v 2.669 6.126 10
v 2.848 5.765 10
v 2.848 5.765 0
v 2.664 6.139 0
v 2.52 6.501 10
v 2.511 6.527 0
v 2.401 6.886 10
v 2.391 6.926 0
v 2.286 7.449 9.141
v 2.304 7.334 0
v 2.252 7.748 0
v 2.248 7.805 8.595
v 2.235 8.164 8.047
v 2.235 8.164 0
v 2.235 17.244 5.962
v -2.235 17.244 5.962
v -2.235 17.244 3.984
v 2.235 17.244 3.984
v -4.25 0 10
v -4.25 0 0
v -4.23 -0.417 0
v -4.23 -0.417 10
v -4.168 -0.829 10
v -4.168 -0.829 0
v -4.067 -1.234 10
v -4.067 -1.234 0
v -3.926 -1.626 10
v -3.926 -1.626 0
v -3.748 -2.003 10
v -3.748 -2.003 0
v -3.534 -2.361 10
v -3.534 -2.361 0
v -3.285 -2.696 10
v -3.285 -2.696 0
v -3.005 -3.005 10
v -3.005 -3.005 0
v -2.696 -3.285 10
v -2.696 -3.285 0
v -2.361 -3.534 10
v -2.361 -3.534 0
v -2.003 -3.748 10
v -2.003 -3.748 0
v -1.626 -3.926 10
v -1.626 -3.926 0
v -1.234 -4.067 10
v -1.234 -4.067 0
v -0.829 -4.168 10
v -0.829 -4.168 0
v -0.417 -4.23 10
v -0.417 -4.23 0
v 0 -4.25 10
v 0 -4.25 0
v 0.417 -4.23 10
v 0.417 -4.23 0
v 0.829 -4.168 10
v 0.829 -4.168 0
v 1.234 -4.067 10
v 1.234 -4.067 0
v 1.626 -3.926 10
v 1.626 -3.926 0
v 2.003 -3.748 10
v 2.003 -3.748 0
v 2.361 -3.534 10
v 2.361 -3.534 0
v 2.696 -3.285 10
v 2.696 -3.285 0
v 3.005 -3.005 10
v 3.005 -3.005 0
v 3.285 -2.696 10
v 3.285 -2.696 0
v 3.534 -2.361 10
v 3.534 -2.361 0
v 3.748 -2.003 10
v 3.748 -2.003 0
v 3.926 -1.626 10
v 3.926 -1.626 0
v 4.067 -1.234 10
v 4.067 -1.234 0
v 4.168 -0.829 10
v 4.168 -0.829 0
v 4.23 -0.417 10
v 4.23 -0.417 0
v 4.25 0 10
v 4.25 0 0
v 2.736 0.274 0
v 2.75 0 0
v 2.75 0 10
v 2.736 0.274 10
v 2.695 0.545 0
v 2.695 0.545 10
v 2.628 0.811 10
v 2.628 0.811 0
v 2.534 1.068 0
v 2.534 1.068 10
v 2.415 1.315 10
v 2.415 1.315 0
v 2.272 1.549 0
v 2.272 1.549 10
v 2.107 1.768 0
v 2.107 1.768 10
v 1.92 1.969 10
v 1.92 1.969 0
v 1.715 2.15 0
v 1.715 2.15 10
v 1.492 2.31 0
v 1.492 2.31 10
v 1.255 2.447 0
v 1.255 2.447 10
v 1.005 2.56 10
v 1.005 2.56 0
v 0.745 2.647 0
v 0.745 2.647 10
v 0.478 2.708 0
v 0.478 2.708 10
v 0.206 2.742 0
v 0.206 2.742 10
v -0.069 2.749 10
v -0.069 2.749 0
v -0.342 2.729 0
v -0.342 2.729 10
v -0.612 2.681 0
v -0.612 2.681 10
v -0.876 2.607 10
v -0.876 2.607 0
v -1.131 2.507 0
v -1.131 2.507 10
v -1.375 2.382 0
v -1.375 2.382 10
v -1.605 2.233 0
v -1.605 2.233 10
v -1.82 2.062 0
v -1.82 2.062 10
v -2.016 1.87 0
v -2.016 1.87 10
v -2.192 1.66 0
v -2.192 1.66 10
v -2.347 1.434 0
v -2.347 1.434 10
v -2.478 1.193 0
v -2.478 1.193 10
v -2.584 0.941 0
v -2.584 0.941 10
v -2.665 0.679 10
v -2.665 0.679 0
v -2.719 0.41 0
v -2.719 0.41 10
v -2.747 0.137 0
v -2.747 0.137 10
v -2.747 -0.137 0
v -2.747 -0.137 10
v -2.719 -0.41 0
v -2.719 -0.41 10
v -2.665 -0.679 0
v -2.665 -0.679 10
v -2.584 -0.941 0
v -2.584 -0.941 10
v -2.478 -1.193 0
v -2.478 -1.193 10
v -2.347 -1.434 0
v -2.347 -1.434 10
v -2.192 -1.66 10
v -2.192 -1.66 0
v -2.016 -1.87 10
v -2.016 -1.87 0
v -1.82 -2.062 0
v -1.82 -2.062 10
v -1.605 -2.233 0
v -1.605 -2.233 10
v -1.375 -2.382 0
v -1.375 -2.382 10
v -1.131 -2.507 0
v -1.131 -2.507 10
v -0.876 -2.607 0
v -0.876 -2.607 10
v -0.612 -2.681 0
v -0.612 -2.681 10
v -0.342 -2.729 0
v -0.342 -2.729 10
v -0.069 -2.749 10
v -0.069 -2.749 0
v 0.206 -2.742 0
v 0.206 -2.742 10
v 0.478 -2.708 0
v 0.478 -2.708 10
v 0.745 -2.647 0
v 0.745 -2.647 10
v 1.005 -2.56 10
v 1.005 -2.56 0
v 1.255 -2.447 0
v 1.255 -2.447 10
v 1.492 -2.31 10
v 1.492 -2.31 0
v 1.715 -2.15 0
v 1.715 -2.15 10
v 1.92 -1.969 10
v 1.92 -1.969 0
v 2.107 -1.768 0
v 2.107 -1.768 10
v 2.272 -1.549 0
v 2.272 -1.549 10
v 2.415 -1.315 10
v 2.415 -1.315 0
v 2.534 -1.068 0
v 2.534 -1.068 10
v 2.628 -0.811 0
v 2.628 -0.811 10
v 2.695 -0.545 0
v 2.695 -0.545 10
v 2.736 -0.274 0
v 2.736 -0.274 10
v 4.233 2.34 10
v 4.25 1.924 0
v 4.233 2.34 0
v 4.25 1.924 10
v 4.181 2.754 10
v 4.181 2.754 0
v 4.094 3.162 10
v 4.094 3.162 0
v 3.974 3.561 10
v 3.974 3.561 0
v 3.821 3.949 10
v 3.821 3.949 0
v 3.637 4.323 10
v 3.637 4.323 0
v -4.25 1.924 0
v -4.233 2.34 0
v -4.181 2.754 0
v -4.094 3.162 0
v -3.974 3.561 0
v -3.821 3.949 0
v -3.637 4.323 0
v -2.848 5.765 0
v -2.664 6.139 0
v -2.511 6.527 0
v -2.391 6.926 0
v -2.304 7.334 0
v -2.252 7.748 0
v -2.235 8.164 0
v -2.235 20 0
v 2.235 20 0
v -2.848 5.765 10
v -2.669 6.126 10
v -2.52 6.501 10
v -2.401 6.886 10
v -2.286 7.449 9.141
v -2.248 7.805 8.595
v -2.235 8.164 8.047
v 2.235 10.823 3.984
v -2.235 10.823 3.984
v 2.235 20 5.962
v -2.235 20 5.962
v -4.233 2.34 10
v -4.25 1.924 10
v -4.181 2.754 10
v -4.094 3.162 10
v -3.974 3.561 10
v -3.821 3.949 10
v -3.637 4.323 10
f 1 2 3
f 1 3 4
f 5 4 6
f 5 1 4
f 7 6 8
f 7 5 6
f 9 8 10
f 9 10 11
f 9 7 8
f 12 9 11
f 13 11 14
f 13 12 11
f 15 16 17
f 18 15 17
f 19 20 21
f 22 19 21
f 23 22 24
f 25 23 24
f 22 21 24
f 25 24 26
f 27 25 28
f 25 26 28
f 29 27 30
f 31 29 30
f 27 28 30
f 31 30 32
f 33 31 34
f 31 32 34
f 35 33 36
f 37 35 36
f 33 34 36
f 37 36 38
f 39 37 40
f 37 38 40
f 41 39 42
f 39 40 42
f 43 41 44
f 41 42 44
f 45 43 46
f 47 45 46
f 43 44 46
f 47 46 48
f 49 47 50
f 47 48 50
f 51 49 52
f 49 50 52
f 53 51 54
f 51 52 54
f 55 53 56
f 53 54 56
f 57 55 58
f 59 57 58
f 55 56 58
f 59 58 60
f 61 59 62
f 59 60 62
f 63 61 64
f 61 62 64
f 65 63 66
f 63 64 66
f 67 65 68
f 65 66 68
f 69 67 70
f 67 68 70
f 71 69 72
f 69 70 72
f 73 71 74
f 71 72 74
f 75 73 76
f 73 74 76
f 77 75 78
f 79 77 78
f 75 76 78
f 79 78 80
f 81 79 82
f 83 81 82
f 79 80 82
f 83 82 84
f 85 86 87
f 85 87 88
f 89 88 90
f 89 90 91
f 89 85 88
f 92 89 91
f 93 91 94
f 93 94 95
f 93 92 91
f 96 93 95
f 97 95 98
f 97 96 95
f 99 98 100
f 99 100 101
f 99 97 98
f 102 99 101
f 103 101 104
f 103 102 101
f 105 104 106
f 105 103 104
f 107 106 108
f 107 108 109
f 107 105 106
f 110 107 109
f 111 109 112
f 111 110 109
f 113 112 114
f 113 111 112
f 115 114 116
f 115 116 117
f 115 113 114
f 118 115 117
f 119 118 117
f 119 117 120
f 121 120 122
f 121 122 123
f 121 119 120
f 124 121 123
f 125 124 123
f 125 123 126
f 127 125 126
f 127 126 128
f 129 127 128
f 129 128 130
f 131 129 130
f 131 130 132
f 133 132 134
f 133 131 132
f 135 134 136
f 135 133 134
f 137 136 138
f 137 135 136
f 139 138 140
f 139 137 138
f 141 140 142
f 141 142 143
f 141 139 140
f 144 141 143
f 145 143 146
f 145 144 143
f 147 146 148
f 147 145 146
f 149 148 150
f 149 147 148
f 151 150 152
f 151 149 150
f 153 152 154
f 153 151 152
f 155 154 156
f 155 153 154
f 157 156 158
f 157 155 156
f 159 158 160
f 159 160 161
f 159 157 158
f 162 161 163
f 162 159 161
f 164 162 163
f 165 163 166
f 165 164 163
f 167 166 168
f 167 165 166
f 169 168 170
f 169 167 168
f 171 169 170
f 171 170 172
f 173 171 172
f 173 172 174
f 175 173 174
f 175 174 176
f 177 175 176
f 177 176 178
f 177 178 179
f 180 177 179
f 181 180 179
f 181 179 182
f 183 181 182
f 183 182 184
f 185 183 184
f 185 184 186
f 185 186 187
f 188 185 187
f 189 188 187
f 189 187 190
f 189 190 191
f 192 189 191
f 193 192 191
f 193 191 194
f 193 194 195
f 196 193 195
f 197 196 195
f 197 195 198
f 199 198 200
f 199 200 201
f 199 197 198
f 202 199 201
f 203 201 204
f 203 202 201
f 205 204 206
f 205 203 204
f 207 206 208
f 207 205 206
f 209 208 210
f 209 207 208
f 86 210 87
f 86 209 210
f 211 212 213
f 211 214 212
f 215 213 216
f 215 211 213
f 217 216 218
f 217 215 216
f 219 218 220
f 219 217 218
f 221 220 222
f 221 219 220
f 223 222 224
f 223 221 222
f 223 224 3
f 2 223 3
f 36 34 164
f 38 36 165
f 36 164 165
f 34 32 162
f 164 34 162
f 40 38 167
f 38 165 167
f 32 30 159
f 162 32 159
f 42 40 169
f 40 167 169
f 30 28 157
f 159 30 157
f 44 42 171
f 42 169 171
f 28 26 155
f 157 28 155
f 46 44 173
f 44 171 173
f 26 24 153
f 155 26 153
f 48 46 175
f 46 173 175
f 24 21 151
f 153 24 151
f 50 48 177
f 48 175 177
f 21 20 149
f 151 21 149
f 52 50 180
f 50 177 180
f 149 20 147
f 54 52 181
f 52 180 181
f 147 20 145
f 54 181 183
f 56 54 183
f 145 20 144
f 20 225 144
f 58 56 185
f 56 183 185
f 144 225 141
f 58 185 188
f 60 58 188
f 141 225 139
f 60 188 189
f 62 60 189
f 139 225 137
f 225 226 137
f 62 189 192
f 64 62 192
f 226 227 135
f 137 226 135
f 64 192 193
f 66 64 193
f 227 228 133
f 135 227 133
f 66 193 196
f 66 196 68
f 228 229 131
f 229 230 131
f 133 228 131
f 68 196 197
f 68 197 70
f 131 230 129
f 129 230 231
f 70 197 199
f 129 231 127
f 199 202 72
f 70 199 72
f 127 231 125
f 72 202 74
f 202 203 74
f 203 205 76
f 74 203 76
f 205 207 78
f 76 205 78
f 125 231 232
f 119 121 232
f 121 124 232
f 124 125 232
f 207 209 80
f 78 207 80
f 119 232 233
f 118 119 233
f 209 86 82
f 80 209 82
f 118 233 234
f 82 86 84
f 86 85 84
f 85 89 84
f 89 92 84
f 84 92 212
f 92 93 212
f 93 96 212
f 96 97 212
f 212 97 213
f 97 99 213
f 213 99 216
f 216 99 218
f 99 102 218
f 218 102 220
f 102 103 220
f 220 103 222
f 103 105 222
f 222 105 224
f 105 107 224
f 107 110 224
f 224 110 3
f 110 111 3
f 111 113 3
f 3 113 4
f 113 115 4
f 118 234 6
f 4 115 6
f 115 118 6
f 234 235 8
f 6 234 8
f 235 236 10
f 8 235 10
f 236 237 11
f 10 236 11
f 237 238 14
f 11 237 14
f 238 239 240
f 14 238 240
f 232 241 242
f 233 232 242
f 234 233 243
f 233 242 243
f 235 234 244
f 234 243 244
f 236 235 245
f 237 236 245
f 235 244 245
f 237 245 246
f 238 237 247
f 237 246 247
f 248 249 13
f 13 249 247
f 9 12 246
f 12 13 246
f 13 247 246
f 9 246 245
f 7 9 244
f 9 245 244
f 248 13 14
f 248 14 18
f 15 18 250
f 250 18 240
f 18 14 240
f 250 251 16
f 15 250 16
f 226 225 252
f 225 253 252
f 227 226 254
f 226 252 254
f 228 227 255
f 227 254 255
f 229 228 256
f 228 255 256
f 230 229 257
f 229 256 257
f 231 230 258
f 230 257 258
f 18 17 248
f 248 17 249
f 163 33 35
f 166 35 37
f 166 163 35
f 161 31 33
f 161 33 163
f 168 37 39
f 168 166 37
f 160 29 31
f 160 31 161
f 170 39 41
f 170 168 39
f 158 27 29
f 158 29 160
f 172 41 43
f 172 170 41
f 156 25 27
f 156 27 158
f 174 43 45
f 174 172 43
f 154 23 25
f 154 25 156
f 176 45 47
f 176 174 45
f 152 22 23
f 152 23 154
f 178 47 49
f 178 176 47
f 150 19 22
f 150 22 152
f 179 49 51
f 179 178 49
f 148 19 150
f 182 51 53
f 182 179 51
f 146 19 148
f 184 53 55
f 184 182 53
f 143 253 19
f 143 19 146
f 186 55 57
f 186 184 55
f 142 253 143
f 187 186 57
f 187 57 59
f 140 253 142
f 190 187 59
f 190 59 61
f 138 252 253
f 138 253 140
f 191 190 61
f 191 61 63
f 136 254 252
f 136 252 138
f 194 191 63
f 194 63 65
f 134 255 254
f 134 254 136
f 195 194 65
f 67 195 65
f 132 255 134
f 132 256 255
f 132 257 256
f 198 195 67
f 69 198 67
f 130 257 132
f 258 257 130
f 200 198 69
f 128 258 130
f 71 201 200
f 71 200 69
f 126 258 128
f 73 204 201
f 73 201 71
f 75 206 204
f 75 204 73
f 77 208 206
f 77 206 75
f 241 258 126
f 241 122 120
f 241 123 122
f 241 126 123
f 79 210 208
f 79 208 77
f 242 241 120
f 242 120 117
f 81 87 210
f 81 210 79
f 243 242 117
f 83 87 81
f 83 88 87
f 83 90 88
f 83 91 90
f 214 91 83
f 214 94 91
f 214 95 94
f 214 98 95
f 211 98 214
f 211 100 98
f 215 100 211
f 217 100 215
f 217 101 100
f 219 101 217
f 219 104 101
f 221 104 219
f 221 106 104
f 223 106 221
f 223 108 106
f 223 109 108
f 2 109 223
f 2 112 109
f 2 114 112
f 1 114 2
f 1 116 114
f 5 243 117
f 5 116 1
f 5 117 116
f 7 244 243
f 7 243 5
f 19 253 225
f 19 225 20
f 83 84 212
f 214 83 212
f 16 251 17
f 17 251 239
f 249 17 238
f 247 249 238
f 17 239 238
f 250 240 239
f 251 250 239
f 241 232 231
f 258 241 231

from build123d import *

# Parameters (mm, degrees)
F0_R     = 2.75
F1_DEPTH = 10
F3_DEPTH = 10
F4_F1_R  = 5
F4_F2_R  = 5
F4_F3_R  = 5
F4_F4_R  = 5


with BuildPart() as f1:
    # F0 (on Top) → F1 (new body)
    with BuildSketch(Plane.XY):
        with BuildLine():
            ThreePointArc((-4.25, 0), (0, 4.25), (4.25, 0))
            Line((4.25, 0), (4.25, 3.201806685))
            Line((4.25, 3.201806685), (2.2350018844, 6.8861790933))
            Line((2.2350018844, 6.8861790933), (2.2350018844, 10.8956433833))
            Line((2.2350018844, 10.8956433833), (2.2350018844, 20))
            Line((2.2350018844, 20), (-2.2350018844, 20))
            Line((-2.2350018844, 20), (-2.2350018844, 10.8956433833))
            Line((-2.2350018844, 10.8956433833), (-2.2350018844, 6.8861790933))
            Line((-2.2350018844, 6.8861790933), (-4.25, 3.201806685))
            Line((-4.25, 3.201806685), (-4.25, 0))
        make_face()
        with BuildLine():
            ThreePointArc((-4.25, 0), (0, -4.25), (4.25, 0))
            ThreePointArc((4.25, 0), (0, 4.25), (-4.25, 0))
        make_face()
        Circle(F0_R, mode=Mode.SUBTRACT)
    extrude(amount=F1_DEPTH)

    # F2 (on face) → F3 (cut)
    with BuildSketch(Plane(origin=(-2.2350018844, 0, 0), x_dir=(0, -1, 0), z_dir=(-1, 0, 0))):
        Polygon((-10.8234519139, 3.9840904064), (-6.8861790933, 10), (-20, 10), (-20, 5.9617315419), (-17.2440130264, 5.9617315419), (-17.2440130264, 3.9840904064), align=None)
    extrude(amount=-F3_DEPTH, mode=Mode.SUBTRACT)

    # F4: fillet of radius 5 on 6 edges, made by hand

    # F4_f1
    f4_f1_edges = [f1.edges().sort_by_distance(p)[0] for p in [
        (-4.25, 3.201806685, 5),
    ]]
    fillet(f4_f1_edges, radius=F4_F1_R)

    # F4_f2
    f4_f2_edges = [f1.edges().sort_by_distance(p)[0] for p in [
        (-2.2350018844, 6.8861790933, 5),
    ]]
    fillet(f4_f2_edges, radius=F4_F2_R)

    # F4_f3
    f4_f3_edges = [f1.edges().sort_by_distance(p)[0] for p in [
        (4.25, 3.201806685, 5),
    ]]
    fillet(f4_f3_edges, radius=F4_F3_R)

    # F4_f4
    f4_f4_edges = [f1.edges().sort_by_distance(p)[0] for p in [
        (2.2350018844, 6.8861790933, 5),
    ]]
    fillet(f4_f4_edges, radius=F4_F4_R)


solid = f1.part
